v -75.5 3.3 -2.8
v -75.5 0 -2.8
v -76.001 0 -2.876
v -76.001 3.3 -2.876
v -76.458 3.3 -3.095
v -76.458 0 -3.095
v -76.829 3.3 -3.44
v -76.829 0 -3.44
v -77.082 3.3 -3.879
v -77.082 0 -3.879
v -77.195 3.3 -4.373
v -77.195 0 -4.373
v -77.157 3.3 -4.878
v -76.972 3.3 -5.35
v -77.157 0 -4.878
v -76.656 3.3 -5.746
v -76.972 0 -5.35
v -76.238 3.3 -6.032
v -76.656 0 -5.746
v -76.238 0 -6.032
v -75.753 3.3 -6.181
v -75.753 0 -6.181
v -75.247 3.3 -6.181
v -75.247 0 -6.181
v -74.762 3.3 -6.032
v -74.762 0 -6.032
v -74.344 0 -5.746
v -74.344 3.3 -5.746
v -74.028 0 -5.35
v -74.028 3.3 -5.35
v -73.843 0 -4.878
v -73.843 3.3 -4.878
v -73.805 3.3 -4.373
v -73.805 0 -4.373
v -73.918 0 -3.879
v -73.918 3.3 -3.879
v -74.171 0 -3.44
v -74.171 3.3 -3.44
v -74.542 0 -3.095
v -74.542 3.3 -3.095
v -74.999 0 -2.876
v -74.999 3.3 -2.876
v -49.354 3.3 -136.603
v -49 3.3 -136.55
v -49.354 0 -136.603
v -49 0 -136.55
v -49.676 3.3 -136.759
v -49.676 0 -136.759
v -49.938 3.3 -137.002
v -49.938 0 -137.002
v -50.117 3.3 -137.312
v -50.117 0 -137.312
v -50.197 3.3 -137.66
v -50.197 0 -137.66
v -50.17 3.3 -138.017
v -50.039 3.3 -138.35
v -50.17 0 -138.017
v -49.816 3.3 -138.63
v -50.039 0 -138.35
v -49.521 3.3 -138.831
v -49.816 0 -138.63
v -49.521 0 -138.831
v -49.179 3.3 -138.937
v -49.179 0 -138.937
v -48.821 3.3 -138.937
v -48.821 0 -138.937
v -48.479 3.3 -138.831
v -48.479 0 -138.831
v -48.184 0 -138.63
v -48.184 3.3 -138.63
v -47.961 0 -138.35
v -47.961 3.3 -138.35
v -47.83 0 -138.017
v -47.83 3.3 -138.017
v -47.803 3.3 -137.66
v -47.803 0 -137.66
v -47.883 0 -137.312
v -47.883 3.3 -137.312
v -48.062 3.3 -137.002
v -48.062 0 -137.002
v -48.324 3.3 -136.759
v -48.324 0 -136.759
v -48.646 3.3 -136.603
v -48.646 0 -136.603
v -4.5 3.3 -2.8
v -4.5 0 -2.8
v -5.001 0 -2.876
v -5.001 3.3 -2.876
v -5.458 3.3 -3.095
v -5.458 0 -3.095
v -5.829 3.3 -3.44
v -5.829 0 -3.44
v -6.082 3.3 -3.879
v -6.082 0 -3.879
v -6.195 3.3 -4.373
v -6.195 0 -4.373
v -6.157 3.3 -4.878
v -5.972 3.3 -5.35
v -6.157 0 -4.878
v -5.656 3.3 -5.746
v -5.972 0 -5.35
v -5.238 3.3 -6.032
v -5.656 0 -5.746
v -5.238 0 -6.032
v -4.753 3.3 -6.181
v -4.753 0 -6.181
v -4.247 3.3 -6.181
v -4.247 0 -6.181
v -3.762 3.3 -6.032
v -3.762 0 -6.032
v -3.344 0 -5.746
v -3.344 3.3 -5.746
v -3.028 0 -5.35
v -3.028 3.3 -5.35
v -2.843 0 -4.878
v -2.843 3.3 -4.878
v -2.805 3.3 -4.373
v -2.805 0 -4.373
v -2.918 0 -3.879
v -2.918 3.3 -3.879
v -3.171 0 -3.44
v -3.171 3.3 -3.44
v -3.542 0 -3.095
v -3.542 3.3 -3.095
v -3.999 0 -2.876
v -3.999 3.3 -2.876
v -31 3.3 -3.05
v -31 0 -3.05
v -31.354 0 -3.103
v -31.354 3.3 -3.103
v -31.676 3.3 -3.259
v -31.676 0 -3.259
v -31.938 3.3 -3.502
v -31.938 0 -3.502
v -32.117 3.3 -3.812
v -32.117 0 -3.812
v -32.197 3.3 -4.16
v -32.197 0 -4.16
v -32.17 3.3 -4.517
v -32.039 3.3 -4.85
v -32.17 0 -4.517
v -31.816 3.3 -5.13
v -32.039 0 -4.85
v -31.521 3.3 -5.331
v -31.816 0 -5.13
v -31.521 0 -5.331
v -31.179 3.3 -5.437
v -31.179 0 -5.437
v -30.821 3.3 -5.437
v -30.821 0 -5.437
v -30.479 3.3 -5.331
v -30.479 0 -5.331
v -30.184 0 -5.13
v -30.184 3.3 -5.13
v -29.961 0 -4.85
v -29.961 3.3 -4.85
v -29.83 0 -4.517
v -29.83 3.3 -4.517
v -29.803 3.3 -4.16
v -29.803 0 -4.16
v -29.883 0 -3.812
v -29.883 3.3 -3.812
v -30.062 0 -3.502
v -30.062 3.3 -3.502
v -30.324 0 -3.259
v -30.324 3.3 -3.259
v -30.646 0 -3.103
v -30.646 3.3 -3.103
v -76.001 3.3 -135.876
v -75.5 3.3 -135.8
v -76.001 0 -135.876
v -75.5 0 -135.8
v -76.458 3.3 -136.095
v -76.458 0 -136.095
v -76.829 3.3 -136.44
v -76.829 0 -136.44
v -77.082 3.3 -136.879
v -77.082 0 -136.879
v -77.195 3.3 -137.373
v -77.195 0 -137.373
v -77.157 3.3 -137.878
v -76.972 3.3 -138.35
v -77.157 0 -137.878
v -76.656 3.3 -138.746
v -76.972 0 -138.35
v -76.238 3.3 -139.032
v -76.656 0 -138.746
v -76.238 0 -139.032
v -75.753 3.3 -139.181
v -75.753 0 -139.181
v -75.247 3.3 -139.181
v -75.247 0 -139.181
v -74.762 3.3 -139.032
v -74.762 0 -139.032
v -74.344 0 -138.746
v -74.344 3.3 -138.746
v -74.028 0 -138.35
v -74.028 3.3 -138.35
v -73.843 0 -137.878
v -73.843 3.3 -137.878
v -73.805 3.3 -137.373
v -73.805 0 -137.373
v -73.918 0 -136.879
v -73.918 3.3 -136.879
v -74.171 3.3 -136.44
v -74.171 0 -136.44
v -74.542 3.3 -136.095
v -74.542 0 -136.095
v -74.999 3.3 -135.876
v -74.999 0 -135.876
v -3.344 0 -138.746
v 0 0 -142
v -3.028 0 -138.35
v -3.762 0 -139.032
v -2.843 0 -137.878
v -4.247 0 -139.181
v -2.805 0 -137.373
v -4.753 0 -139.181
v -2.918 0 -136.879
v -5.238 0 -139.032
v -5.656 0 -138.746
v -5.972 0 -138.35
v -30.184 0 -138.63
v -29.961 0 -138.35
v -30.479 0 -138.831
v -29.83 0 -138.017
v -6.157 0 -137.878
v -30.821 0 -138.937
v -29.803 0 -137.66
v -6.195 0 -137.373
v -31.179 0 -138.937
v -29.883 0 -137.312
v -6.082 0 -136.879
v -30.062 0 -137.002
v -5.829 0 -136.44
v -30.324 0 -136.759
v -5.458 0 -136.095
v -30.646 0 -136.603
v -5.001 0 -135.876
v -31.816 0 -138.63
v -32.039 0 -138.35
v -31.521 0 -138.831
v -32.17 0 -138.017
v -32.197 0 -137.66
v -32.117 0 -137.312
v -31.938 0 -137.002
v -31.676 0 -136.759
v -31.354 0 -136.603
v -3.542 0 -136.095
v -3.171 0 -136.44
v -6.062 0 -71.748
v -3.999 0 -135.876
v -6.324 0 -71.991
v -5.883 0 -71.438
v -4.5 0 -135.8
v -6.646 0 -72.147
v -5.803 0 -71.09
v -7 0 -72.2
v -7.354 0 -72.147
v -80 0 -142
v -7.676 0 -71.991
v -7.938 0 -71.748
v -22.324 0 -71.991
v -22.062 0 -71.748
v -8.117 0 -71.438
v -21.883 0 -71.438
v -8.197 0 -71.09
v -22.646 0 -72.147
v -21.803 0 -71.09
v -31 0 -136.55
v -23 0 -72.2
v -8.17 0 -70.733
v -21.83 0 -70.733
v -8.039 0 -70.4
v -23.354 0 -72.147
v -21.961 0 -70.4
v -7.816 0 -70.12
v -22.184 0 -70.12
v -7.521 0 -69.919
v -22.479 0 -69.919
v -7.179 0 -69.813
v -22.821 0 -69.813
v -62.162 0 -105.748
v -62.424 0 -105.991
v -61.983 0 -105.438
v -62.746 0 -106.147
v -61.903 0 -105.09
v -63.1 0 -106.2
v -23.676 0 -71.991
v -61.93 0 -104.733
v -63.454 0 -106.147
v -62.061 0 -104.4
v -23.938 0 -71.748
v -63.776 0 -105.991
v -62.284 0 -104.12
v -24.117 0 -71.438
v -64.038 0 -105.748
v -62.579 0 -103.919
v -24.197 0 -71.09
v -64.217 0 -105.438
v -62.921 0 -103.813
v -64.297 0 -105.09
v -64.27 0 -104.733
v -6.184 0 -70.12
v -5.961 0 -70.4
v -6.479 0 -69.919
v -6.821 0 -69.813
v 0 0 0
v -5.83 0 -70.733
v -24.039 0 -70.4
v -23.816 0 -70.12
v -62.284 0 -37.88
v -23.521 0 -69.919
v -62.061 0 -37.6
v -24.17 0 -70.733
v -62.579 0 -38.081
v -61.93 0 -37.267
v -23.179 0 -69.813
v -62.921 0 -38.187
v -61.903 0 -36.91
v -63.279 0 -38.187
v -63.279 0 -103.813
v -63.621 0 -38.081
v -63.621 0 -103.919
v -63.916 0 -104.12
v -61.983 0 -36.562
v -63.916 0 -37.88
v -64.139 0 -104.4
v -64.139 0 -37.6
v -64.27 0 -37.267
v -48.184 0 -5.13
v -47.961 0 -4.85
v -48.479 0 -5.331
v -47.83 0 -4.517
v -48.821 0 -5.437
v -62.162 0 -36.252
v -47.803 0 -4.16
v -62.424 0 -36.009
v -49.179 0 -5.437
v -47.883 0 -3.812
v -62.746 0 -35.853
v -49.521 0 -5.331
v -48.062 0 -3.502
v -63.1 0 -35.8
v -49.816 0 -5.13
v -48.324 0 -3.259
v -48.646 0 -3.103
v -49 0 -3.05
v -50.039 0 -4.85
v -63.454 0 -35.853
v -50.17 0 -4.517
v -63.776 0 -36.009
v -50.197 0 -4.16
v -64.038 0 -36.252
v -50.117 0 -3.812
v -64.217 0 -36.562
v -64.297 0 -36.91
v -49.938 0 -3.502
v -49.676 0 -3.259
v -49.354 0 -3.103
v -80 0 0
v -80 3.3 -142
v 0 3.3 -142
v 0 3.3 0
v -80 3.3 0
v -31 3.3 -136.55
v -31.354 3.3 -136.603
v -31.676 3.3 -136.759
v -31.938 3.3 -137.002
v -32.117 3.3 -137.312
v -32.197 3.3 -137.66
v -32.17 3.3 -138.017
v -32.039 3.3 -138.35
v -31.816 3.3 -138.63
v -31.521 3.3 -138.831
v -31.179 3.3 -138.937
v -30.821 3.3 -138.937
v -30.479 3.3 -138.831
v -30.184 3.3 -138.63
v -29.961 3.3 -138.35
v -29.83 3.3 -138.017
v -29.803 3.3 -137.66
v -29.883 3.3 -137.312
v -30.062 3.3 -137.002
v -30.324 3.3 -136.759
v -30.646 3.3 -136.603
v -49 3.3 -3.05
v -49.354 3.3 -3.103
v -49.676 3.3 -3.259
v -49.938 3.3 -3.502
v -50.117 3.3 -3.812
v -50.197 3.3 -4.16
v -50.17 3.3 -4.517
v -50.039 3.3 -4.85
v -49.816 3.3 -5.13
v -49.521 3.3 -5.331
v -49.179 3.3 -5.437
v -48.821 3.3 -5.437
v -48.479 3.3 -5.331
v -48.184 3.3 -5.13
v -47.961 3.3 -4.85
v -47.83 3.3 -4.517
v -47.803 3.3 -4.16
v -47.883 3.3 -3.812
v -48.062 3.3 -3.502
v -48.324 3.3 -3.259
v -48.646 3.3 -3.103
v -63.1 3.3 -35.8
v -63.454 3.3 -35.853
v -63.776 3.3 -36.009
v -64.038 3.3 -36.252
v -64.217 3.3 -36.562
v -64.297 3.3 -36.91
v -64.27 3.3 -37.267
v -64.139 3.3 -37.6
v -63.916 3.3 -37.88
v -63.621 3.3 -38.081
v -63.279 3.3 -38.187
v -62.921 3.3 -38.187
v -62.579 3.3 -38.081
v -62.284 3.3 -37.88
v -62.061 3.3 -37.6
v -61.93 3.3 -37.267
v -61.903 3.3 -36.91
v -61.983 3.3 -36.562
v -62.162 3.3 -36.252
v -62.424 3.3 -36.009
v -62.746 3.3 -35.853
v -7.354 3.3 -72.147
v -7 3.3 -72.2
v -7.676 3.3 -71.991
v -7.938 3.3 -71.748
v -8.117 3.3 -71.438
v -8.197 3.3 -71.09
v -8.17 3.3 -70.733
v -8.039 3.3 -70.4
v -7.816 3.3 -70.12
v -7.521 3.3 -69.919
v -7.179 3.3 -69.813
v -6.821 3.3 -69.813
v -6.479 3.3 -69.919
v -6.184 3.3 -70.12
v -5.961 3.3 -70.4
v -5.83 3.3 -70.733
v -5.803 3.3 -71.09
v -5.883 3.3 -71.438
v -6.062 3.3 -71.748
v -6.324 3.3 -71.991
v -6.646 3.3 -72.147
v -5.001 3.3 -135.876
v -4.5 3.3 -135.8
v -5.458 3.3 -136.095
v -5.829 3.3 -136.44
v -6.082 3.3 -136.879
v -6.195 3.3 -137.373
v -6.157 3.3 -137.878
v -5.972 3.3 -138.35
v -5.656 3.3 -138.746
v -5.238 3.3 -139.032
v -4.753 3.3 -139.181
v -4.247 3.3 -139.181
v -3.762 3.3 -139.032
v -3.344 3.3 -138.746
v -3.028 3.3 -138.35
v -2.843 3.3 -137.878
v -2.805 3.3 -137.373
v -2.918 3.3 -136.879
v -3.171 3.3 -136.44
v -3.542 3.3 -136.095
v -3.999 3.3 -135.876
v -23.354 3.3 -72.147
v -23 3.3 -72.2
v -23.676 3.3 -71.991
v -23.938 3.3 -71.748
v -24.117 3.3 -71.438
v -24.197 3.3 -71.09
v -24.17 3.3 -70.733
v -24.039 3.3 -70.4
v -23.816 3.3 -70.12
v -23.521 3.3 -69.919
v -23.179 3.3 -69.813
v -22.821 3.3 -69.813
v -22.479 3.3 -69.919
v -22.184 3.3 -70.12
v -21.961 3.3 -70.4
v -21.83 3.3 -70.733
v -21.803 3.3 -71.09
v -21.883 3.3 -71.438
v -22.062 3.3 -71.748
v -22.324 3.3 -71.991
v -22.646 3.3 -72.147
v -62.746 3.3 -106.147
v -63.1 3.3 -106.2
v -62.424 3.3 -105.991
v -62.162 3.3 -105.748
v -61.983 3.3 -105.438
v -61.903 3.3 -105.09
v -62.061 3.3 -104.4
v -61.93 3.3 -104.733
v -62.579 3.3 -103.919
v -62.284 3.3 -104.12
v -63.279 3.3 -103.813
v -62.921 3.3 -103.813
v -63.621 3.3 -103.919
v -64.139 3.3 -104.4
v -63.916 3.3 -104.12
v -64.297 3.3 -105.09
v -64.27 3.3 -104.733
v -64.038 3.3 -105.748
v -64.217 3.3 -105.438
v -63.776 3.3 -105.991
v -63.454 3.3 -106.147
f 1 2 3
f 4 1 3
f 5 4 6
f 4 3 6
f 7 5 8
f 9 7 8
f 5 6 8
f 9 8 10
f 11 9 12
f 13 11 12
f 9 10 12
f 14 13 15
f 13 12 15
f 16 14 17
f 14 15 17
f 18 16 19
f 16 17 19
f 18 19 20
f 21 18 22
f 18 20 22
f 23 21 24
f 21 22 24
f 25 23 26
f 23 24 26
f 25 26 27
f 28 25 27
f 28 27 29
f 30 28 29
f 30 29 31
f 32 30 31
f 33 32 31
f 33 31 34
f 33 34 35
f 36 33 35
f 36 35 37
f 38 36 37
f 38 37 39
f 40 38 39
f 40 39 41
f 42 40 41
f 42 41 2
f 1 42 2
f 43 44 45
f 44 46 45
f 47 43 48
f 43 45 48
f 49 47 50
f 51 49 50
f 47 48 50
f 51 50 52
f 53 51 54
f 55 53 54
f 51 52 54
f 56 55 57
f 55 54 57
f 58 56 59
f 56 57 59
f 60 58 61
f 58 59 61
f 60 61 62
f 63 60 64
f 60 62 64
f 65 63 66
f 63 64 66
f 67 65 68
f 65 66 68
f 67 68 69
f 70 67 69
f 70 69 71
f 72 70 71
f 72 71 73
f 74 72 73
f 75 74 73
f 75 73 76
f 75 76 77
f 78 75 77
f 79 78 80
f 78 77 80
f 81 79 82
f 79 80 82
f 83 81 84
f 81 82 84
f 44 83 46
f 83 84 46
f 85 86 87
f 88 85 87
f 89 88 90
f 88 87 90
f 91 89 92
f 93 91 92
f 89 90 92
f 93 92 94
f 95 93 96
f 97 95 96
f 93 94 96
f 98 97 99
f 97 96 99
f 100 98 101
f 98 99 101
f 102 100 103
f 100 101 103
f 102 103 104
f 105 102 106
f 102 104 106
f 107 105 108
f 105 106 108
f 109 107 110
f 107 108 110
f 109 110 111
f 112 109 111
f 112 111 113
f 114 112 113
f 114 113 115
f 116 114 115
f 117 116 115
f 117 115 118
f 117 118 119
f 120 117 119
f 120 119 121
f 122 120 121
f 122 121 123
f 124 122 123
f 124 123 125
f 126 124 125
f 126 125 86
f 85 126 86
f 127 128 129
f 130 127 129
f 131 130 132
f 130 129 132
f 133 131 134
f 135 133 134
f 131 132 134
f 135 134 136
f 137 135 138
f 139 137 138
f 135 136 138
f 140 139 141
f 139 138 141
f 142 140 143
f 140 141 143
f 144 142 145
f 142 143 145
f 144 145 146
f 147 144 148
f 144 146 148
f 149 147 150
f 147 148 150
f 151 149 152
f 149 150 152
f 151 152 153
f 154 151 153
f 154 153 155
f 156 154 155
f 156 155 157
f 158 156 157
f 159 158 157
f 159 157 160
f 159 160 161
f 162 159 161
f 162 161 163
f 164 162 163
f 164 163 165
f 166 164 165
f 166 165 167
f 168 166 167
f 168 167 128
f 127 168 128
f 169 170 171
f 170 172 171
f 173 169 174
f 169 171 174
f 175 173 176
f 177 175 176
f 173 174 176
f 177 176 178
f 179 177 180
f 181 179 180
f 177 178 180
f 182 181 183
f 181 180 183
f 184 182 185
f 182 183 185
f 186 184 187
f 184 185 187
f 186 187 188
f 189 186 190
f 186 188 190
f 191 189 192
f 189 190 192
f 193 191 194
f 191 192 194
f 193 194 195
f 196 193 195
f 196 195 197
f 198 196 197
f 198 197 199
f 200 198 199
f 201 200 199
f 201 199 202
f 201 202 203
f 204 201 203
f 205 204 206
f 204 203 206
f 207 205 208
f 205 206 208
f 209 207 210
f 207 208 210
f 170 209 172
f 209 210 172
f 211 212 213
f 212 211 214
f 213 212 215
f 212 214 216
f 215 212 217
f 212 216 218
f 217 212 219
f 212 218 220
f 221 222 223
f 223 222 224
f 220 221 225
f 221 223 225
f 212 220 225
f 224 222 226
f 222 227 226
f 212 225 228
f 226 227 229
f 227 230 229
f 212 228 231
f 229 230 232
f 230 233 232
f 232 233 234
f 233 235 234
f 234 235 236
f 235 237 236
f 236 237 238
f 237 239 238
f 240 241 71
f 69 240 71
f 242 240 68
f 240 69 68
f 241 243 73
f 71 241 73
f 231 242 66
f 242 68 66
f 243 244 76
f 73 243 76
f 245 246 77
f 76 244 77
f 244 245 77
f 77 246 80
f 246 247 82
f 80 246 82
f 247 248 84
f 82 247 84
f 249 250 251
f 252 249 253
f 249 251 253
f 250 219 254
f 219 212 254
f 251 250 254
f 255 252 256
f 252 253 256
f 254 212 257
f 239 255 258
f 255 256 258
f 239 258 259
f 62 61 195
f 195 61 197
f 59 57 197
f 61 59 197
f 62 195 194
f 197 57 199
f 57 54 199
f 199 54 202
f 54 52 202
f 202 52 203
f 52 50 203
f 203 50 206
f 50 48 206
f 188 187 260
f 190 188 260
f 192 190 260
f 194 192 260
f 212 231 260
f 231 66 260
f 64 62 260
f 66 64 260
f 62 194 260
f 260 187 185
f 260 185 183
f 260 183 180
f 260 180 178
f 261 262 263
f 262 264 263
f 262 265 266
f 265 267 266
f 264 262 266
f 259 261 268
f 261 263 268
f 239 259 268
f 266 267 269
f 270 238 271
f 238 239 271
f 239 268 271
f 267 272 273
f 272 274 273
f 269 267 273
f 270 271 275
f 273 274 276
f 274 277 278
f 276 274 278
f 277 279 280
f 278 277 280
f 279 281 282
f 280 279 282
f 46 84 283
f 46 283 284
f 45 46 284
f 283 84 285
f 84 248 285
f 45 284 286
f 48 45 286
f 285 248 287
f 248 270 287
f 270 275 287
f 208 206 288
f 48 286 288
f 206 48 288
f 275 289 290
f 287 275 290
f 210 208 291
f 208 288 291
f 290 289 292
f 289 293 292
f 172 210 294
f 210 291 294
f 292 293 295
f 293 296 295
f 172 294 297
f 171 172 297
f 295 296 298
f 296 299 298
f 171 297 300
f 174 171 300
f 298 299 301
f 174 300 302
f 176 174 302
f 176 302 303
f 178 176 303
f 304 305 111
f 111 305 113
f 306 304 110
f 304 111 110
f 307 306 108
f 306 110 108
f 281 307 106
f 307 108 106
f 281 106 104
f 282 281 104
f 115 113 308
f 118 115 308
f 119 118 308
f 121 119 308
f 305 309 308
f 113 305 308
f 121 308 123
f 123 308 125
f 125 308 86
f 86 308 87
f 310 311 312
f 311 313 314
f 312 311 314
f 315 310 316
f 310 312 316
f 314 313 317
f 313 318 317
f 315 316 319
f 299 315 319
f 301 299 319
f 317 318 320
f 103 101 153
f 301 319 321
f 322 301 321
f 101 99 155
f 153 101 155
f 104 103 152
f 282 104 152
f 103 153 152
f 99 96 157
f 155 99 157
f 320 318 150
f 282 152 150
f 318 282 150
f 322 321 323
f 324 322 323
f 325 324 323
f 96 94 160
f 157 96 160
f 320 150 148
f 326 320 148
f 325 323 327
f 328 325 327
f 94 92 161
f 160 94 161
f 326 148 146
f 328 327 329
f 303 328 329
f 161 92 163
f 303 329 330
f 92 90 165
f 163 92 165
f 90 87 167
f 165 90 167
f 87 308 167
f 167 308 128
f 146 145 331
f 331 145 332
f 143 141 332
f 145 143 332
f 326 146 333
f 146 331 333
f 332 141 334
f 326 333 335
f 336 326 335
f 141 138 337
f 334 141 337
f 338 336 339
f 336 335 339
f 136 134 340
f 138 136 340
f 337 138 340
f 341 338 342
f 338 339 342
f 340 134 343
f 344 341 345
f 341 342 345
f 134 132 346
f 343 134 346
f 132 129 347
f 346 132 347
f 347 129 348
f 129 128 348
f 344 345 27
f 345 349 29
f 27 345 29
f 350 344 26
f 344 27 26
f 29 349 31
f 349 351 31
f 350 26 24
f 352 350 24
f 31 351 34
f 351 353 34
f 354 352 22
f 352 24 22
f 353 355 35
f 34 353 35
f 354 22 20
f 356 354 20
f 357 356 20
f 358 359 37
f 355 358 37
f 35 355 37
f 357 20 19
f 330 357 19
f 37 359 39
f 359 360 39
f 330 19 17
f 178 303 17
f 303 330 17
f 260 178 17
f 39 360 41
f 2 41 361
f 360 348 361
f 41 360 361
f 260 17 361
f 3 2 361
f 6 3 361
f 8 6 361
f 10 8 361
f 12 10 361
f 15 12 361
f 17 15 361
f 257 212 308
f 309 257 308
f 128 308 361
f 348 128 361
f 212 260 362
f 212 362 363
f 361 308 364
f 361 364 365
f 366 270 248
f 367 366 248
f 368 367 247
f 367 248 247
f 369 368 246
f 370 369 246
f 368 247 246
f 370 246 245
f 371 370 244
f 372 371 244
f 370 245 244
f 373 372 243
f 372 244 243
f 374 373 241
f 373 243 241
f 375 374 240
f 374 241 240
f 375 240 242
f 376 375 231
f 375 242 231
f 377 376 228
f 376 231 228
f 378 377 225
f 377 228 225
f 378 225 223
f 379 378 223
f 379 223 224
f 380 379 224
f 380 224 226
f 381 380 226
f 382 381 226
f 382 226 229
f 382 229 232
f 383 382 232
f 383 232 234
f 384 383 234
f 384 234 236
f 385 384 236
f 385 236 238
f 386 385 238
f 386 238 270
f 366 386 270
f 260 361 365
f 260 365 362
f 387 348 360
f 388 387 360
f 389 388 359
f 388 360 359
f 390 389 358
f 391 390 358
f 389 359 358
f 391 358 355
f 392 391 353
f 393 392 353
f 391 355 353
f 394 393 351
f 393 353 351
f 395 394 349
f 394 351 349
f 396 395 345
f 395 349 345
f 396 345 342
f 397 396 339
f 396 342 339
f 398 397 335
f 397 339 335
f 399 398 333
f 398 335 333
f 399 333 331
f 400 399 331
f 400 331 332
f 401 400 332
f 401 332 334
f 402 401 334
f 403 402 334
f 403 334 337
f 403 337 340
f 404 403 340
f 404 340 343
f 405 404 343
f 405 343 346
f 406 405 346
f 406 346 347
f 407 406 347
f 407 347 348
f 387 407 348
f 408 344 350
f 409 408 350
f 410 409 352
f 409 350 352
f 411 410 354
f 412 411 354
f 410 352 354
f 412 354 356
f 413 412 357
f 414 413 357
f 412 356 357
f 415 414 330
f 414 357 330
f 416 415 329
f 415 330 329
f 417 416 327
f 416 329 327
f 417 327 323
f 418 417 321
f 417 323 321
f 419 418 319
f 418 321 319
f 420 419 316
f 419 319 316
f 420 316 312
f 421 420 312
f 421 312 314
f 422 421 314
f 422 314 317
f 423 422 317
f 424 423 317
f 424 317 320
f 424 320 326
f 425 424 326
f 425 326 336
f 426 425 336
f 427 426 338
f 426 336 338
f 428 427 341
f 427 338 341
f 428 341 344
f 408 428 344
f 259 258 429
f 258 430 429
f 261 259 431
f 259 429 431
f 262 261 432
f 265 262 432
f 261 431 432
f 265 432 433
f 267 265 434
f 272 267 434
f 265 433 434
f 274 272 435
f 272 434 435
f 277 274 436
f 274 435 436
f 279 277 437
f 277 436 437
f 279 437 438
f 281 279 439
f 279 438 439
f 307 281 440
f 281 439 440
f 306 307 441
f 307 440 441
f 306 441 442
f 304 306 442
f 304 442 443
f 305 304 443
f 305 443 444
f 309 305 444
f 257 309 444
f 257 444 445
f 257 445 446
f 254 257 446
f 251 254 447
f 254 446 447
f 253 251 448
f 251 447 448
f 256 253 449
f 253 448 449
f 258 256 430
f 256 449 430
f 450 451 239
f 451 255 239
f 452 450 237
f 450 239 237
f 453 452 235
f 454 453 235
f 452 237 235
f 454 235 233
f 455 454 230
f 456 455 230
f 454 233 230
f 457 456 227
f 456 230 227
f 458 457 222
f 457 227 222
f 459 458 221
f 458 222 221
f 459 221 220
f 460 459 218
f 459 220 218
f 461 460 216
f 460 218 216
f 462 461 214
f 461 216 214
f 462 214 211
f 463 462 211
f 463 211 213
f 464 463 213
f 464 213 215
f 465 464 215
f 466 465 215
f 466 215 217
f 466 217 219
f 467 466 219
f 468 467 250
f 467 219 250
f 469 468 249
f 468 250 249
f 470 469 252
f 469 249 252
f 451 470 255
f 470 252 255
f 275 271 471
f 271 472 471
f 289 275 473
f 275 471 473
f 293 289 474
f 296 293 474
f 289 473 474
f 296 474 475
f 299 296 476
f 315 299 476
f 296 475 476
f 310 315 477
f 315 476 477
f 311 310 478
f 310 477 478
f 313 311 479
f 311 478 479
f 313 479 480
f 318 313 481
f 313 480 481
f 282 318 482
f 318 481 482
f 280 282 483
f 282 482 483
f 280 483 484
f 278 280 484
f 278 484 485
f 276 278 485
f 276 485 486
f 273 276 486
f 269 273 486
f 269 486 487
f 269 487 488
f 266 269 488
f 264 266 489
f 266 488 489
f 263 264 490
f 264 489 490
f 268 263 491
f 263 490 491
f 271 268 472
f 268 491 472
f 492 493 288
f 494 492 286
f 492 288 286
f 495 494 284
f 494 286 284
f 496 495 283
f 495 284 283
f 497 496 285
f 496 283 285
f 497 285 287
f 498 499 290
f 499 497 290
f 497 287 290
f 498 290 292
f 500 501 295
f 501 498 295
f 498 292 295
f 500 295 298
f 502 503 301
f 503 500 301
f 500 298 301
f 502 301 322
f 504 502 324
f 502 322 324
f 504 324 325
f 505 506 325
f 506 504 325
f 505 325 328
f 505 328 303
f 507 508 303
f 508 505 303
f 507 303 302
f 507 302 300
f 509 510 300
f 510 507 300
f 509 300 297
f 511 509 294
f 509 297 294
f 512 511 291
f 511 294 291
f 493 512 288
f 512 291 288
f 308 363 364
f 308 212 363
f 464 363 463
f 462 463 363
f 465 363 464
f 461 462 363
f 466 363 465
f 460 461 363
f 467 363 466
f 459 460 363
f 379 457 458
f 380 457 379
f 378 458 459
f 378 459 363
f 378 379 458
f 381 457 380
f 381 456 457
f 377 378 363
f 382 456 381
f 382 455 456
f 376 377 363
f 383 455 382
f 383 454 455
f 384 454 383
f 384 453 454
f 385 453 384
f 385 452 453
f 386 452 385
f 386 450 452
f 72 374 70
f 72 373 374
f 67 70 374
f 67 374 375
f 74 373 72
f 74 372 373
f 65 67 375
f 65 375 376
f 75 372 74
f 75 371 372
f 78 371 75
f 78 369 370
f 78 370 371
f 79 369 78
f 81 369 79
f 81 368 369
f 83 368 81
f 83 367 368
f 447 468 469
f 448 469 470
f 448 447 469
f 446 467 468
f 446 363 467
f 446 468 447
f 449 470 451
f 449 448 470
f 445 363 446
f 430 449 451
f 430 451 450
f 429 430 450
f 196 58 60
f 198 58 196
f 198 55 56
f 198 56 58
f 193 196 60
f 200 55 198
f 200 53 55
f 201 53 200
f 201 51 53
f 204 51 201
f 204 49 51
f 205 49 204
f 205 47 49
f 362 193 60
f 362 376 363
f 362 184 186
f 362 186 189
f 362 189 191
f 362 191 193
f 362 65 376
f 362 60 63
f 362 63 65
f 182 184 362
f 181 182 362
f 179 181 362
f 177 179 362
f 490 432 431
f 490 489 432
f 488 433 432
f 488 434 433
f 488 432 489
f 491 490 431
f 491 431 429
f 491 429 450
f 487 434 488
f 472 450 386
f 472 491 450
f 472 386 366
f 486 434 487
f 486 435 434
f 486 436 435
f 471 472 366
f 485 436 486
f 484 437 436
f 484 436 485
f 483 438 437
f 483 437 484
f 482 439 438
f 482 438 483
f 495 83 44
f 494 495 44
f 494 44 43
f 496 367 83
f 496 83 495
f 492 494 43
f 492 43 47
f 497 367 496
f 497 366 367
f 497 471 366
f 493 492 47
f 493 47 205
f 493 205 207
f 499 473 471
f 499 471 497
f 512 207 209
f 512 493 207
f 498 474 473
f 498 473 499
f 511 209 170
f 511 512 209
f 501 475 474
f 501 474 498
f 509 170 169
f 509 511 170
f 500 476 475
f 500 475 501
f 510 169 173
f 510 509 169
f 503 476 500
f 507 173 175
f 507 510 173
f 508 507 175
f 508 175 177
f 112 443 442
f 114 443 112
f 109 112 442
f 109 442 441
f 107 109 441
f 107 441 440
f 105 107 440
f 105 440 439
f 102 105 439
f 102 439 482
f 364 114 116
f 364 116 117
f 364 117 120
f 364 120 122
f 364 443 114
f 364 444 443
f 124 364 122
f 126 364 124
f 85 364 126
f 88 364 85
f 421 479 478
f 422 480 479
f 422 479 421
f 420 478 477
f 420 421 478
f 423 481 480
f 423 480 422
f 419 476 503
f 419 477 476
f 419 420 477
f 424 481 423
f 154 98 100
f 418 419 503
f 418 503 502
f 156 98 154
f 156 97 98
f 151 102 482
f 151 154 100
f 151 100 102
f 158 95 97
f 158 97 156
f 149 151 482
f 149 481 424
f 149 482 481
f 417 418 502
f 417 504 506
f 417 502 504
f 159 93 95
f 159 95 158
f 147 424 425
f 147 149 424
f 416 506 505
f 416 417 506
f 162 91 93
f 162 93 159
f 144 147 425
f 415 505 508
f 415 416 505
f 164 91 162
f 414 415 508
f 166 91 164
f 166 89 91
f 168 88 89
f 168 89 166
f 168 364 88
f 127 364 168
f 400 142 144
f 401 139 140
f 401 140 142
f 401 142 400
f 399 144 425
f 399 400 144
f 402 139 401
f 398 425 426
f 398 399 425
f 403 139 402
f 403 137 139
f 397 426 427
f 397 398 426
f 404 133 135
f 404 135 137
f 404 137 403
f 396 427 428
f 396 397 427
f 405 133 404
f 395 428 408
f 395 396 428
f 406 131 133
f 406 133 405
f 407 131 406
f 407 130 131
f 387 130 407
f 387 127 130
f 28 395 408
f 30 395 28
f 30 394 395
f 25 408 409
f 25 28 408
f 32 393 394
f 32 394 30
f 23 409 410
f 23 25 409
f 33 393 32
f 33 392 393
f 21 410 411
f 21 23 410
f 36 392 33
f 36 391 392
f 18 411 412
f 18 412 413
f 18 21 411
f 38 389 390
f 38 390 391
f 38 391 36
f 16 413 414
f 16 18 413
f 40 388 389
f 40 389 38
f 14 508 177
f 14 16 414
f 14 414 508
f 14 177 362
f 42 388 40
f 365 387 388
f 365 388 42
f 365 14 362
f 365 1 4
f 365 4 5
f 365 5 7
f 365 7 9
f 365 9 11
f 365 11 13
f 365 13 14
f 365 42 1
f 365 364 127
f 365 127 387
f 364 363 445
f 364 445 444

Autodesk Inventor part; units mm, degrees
ref_plane "YZ Plane" through (0, 0, 0) normal (1, 0, 0) x (0, 1, 0)
ref_plane "XZ Plane" through (0, 0, 0) normal (0, 1, 0) x (-1, 0, 0)
ref_plane "XY Plane" through (0, 0, 0) normal (0, 0, 1) x (1, 0, 0)
sketch "スケッチ1" plane through (0, 0, 0) normal (0, 1, 0) x (-1, 0, 0)
  line L0 (0, 0) -> (80, 0)
  line L1 (80, 0) -> (80, -142)
  line L2 (80, -142) -> (0, -142)
  line L3 (0, -142) -> (0, 0)
  dimension "d0" = 80
  dimension "d1" = 142
extrude "押し出し1" add sketch "スケッチ1" along normal blind 3.3
hole "穴1" at (-75.5, 3.3, -4.5) direction (0, -1, 0) diameter 3.4 end through all
hole "穴2" at (-4.5, 3.3, -4.5) direction (0, -1, 0) diameter 3.4 end through all
hole "穴3" at (-4.5, 3.3, -137.5) direction (0, -1, 0) diameter 3.4 end through all
hole "穴4" at (-75.5, 3.3, -137.5) direction (0, -1, 0) diameter 3.4 end through all
hole "穴5" at (-49, 3.3, -137.75) direction (0, -1, 0) diameter 2.4 end through all
hole "穴6" at (-31, 3.3, -137.75) direction (0, -1, 0) diameter 2.4 end through all
hole "穴7" at (-31, 3.3, -4.25) direction (0, -1, 0) diameter 2.4 end through all
hole "穴8" at (-49, 3.3, -4.25) direction (0, -1, 0) diameter 2.4 end through all
hole "穴9" at (-7, 0, -71) direction (0, 1, 0) diameter 2.4 end through all
hole "穴10" at (-23, 0, -71) direction (0, 1, 0) diameter 2.4 end through all
sketch "スケッチ3" plane through (0, 3.3, 0) normal (0, 1, 0) x (1, 0, 0)
  line L0 (0, 0) -> (0, 142) projected
  line L1 (0, 71) -> (-80, 71)
  line L2 (-80, 142) -> (-80, 0) projected
hole "穴15" at (-63.1, 3.3, -37) direction (0, -1, 0) diameter 2.4 end through all
ref_plane "作業平面1" through (0, 3.3, -71) normal (0, 0, -1) x (-1, 0, 0)
mirror "ミラー1" about plane through (0, 3.3, -71) normal (0, 0, -1) of "穴15"
properties part number "基本板(センサ1つ)" material "アルミニウム 5052"
